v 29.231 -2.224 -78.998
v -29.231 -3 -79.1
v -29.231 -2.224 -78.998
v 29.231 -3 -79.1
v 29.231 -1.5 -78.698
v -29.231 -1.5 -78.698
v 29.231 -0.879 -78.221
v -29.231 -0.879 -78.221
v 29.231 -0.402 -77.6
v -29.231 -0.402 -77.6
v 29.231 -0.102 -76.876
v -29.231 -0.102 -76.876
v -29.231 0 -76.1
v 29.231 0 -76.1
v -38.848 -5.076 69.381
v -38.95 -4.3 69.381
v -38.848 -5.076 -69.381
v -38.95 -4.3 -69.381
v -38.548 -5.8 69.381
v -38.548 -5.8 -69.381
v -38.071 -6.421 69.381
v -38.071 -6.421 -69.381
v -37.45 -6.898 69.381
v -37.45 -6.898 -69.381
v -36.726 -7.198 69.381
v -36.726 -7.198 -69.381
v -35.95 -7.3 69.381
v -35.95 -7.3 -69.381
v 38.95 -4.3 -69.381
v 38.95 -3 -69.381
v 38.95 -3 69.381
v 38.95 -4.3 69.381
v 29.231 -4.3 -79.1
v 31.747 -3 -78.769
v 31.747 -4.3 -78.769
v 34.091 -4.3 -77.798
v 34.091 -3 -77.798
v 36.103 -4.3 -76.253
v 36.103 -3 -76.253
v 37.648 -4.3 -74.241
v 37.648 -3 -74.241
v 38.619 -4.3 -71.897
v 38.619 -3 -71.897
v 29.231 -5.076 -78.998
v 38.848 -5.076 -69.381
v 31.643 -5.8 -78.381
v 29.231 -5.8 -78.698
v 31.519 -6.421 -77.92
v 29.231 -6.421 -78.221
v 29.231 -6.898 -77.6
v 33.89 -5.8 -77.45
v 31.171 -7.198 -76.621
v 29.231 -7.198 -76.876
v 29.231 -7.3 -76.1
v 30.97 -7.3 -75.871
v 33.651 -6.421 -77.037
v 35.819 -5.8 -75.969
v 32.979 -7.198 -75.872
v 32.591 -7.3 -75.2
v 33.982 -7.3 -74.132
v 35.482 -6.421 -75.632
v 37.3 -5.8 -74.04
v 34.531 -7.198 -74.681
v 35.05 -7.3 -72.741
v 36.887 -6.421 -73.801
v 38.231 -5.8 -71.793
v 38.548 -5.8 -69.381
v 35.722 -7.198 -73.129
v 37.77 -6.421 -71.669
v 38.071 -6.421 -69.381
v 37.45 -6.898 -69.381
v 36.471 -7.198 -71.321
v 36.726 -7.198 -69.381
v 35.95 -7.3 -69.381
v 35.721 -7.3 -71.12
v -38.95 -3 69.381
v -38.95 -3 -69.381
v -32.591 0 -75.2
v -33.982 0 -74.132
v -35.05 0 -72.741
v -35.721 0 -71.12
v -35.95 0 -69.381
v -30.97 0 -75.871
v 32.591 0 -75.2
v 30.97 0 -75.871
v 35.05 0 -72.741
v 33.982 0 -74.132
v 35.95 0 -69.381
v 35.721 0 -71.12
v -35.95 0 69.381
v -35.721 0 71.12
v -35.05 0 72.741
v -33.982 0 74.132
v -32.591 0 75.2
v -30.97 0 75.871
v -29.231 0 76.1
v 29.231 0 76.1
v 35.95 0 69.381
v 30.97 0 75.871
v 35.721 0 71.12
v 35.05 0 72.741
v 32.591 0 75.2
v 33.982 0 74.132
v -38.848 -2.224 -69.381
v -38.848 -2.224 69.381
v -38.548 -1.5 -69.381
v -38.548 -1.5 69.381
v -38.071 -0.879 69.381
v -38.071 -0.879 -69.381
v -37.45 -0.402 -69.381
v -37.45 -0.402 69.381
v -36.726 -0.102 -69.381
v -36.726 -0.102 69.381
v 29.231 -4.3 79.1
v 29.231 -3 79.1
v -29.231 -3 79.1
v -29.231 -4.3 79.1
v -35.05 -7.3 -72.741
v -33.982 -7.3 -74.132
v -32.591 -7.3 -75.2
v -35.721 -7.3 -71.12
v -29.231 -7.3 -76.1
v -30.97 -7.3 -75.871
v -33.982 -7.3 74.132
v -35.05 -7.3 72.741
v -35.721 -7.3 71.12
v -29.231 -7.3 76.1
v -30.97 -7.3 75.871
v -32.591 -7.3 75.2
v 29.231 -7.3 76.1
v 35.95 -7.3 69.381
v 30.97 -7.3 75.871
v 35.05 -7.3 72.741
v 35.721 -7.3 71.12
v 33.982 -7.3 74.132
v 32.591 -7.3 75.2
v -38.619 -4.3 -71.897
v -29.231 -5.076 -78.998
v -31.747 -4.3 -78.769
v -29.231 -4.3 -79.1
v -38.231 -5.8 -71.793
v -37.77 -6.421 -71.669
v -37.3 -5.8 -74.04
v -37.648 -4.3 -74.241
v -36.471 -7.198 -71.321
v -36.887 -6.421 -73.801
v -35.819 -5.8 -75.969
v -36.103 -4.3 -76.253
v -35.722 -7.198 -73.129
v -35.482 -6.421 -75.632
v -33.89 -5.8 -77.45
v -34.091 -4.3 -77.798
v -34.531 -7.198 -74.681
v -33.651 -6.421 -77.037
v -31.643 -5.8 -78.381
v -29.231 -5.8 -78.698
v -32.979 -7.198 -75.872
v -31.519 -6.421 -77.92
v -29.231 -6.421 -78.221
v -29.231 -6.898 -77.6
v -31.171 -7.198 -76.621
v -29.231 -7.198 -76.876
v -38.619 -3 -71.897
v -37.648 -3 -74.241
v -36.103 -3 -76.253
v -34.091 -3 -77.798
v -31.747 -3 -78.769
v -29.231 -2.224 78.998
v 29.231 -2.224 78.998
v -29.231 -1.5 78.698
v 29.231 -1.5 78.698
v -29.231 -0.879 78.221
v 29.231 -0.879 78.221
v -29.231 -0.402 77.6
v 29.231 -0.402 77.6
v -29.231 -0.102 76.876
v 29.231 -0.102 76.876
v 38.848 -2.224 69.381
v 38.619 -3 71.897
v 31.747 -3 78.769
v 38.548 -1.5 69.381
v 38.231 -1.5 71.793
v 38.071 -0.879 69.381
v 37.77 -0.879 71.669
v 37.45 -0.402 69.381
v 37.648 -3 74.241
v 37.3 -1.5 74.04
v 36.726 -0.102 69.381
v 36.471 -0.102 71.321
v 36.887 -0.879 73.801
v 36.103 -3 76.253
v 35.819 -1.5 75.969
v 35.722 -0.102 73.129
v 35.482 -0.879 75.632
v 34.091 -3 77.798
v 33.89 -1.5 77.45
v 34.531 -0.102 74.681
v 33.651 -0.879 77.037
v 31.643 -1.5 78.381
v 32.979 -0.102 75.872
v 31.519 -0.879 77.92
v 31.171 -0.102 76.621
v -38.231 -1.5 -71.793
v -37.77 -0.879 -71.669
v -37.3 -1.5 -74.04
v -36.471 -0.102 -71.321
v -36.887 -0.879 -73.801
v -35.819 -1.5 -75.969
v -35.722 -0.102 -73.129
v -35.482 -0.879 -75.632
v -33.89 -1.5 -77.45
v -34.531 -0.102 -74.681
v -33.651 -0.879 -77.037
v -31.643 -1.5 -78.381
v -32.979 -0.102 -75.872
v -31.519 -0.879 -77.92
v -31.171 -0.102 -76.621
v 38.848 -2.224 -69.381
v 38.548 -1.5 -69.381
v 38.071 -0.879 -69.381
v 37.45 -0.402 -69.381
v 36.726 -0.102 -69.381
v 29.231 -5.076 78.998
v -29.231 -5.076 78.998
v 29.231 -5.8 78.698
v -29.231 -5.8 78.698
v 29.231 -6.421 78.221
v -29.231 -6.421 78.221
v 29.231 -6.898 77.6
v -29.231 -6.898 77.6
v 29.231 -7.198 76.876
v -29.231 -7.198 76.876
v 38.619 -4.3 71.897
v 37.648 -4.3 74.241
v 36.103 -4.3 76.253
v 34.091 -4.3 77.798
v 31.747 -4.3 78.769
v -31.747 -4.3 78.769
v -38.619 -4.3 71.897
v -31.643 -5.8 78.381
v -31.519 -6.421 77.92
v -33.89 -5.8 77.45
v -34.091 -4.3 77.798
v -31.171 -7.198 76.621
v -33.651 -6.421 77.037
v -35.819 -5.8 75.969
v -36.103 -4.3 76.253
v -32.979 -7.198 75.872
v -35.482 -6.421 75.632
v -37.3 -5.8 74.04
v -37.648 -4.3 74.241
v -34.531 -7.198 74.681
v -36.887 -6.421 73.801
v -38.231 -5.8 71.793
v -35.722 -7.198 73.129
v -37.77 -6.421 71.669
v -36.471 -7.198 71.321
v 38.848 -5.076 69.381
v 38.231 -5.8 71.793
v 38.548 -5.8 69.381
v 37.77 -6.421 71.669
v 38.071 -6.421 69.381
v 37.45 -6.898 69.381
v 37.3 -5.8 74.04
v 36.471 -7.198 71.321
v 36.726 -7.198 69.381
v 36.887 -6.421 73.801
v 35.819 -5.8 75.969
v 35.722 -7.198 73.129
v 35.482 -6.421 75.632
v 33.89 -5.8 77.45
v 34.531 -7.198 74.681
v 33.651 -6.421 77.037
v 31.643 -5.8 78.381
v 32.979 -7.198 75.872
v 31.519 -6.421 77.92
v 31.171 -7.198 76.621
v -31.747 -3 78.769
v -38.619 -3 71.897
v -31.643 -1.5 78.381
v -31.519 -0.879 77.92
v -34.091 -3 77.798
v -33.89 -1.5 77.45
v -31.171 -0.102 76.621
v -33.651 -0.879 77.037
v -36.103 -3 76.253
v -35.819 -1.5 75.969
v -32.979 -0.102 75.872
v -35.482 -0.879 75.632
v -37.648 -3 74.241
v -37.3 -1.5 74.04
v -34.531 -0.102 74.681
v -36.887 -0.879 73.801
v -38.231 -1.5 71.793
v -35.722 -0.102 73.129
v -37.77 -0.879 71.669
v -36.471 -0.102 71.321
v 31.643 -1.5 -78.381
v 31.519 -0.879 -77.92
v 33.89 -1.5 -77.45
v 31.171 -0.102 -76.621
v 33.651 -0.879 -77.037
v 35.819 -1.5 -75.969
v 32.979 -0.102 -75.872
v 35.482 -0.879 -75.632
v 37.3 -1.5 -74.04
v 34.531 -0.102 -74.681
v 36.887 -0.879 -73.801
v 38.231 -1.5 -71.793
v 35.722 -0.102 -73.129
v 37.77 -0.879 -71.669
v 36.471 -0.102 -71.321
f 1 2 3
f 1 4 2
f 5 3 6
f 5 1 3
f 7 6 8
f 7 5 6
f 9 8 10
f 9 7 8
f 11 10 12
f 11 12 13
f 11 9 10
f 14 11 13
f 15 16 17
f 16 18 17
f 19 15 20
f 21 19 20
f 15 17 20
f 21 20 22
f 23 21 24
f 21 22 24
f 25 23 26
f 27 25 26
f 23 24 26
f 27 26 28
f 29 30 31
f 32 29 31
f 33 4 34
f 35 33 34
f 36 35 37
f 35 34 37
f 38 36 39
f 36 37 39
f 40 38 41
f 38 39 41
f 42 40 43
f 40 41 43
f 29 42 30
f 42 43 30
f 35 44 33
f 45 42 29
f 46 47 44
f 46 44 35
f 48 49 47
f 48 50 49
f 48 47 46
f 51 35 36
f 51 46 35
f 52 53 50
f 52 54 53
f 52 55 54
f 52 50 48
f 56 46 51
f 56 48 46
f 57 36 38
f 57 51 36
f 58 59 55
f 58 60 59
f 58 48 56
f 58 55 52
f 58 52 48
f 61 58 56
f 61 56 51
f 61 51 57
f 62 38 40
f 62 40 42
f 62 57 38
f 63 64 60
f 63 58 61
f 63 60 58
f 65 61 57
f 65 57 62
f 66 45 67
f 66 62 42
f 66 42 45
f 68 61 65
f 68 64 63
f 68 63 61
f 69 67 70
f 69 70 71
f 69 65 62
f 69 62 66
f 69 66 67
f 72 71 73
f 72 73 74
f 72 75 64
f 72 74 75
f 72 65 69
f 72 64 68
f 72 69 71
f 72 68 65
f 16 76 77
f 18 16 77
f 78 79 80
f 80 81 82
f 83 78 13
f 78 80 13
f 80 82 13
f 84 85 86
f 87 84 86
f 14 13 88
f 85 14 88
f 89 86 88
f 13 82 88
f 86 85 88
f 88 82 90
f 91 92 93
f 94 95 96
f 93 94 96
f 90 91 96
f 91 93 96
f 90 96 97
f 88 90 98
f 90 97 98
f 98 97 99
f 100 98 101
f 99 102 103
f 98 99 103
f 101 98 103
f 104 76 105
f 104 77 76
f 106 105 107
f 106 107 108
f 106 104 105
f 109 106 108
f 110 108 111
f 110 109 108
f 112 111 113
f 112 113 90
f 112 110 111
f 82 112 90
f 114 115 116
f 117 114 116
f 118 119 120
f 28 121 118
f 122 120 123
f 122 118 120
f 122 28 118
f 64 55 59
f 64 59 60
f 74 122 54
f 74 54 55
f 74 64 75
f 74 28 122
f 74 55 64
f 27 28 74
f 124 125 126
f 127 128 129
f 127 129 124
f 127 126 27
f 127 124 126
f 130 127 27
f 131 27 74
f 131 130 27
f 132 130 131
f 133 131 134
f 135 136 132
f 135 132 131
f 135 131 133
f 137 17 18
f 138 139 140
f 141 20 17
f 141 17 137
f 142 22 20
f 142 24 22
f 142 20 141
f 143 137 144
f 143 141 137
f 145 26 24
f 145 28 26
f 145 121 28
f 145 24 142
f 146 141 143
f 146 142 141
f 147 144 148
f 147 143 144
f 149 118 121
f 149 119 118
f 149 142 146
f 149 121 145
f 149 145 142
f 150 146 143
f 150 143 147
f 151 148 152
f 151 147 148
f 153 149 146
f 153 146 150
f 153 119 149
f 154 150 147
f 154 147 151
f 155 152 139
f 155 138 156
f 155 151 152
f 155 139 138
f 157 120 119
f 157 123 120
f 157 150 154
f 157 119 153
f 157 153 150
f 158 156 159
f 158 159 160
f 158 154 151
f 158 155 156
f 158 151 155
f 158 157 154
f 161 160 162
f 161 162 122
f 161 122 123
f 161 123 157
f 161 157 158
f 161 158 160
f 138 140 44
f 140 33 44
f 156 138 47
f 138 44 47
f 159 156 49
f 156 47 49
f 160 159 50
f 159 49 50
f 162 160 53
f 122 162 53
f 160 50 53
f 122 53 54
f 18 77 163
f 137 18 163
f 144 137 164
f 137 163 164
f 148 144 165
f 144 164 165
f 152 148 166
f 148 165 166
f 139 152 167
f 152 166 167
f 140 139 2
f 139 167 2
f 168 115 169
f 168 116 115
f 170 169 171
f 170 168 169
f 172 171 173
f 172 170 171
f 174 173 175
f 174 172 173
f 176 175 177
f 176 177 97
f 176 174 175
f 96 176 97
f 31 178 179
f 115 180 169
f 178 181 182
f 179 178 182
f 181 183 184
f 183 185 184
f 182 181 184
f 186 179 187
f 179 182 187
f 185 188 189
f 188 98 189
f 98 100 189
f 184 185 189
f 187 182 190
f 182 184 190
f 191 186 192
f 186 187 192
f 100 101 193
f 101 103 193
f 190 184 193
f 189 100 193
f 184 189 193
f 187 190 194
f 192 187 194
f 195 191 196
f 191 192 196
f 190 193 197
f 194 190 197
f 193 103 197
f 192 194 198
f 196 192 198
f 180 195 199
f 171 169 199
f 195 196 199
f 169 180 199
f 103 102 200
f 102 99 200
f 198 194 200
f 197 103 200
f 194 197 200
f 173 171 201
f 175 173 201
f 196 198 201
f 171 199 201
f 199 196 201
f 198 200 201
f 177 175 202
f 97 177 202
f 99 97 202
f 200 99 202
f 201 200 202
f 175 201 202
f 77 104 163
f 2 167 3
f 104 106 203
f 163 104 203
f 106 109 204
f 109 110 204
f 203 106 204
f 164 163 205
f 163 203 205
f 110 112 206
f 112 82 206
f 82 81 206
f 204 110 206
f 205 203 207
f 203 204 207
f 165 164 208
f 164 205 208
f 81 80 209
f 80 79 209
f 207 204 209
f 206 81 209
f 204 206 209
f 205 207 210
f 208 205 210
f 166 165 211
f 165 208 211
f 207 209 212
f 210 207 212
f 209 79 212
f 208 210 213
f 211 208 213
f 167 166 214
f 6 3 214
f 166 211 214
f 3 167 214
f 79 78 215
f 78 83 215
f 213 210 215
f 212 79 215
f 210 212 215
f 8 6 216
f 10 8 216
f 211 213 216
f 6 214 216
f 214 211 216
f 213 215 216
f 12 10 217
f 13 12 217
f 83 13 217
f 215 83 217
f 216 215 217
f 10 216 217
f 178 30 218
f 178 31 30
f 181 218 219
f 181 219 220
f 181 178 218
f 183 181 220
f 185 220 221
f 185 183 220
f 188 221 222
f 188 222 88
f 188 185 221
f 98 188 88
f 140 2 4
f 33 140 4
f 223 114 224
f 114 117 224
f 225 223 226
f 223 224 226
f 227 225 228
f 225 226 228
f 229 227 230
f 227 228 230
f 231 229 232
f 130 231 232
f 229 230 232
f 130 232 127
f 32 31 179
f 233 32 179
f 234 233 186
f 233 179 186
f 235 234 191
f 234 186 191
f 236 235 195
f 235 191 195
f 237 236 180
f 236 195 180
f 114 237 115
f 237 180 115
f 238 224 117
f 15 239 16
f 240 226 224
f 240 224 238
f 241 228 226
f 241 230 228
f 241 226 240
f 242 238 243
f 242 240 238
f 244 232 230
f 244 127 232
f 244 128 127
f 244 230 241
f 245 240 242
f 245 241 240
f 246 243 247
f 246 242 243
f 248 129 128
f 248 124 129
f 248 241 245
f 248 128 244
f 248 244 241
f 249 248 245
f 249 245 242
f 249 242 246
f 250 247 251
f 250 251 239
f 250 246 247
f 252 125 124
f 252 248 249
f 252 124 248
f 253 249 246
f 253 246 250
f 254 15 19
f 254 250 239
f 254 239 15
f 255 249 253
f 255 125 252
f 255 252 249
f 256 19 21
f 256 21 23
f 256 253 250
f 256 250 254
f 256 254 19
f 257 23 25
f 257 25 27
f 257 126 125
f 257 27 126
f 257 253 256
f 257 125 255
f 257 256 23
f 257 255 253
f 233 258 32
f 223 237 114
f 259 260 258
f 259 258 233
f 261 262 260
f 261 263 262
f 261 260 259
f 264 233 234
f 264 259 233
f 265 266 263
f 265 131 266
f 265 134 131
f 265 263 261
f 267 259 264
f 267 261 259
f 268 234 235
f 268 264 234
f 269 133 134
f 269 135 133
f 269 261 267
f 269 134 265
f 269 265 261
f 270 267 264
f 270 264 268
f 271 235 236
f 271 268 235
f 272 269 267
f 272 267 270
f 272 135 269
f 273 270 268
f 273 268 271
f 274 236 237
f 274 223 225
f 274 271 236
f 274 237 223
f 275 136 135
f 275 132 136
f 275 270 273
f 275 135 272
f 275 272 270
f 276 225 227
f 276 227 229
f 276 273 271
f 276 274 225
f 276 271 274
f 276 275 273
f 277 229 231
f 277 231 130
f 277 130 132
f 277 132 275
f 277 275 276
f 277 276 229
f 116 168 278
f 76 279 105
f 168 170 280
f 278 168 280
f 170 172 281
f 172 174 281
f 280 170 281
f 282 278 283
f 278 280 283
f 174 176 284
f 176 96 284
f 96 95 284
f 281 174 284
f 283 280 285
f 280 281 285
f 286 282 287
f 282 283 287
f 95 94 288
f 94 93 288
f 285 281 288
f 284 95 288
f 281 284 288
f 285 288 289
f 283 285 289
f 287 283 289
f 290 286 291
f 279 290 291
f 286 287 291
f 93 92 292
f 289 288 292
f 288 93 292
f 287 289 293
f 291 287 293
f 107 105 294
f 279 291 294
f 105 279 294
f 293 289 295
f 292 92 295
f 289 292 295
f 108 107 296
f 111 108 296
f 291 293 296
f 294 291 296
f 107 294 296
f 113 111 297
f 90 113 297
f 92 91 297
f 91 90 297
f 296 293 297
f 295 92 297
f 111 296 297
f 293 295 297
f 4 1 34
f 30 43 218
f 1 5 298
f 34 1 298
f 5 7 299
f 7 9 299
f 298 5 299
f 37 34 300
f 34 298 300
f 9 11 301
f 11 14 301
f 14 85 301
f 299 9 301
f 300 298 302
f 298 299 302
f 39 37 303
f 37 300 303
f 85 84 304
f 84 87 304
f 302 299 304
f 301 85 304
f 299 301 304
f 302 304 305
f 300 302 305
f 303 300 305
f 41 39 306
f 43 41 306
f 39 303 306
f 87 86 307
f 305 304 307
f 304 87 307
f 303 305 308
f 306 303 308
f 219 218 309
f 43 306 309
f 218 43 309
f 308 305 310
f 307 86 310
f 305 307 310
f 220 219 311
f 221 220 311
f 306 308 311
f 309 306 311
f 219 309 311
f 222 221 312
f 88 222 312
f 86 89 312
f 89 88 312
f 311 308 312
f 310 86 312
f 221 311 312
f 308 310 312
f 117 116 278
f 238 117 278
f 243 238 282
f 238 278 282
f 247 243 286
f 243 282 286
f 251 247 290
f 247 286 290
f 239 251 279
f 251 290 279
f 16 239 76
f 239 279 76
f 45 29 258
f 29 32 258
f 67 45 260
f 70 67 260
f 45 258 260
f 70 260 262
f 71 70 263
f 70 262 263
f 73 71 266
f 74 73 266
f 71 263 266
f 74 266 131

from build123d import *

# Parameters (mm, degrees)
F1_DEPTH = 7.3
F2_R     = 3


with BuildPart() as f1:
    # F0 (on Front) → F1 (new body)
    with BuildSketch(Plane.XZ):
        with BuildLine():
            Line((29.231137, 79.1), (-29.231137, 79.1))
            ThreePointArc((-29.231137, 79.1), (-36.103411, 76.253411), (-38.95, 69.381137))
            Line((-38.95, 69.381137), (-38.95, -69.381137))
            ThreePointArc((-38.95, -69.381137), (-36.103411, -76.253411), (-29.231137, -79.1))
            Line((-29.231137, -79.1), (29.231137, -79.1))
            ThreePointArc((29.231137, -79.1), (36.103411, -76.253411), (38.95, -69.381137))
            Line((38.95, -69.381137), (38.95, 69.381137))
            ThreePointArc((38.95, 69.381137), (36.103411, 76.253411), (29.231137, 79.1))
        make_face()
    extrude(amount=F1_DEPTH)

    # F2
    f2_edges = [f1.edges().sort_by_distance(p)[0] for p in [
        (38.95, -7.3, 0),
        (36.103411, -7.3, 76.253411),
        (0, -7.3, 79.1),
        (-36.103411, -7.3, 76.253411),
        (-38.95, -7.3, 0),
        (-36.103411, -7.3, -76.253411),
        (0, -7.3, -79.1),
        (36.103411, -7.3, -76.253411),
        (38.95, 0, 0),
        (36.103411, 0, 76.253411),
        (0, 0, 79.1),
        (-36.103411, 0, 76.253411),
        (-38.95, 0, 0),
        (-36.103411, 0, -76.253411),
        (0, 0, -79.1),
        (36.103411, 0, -76.253411),
    ]]
    fillet(f2_edges, radius=F2_R)


solid = f1.part
